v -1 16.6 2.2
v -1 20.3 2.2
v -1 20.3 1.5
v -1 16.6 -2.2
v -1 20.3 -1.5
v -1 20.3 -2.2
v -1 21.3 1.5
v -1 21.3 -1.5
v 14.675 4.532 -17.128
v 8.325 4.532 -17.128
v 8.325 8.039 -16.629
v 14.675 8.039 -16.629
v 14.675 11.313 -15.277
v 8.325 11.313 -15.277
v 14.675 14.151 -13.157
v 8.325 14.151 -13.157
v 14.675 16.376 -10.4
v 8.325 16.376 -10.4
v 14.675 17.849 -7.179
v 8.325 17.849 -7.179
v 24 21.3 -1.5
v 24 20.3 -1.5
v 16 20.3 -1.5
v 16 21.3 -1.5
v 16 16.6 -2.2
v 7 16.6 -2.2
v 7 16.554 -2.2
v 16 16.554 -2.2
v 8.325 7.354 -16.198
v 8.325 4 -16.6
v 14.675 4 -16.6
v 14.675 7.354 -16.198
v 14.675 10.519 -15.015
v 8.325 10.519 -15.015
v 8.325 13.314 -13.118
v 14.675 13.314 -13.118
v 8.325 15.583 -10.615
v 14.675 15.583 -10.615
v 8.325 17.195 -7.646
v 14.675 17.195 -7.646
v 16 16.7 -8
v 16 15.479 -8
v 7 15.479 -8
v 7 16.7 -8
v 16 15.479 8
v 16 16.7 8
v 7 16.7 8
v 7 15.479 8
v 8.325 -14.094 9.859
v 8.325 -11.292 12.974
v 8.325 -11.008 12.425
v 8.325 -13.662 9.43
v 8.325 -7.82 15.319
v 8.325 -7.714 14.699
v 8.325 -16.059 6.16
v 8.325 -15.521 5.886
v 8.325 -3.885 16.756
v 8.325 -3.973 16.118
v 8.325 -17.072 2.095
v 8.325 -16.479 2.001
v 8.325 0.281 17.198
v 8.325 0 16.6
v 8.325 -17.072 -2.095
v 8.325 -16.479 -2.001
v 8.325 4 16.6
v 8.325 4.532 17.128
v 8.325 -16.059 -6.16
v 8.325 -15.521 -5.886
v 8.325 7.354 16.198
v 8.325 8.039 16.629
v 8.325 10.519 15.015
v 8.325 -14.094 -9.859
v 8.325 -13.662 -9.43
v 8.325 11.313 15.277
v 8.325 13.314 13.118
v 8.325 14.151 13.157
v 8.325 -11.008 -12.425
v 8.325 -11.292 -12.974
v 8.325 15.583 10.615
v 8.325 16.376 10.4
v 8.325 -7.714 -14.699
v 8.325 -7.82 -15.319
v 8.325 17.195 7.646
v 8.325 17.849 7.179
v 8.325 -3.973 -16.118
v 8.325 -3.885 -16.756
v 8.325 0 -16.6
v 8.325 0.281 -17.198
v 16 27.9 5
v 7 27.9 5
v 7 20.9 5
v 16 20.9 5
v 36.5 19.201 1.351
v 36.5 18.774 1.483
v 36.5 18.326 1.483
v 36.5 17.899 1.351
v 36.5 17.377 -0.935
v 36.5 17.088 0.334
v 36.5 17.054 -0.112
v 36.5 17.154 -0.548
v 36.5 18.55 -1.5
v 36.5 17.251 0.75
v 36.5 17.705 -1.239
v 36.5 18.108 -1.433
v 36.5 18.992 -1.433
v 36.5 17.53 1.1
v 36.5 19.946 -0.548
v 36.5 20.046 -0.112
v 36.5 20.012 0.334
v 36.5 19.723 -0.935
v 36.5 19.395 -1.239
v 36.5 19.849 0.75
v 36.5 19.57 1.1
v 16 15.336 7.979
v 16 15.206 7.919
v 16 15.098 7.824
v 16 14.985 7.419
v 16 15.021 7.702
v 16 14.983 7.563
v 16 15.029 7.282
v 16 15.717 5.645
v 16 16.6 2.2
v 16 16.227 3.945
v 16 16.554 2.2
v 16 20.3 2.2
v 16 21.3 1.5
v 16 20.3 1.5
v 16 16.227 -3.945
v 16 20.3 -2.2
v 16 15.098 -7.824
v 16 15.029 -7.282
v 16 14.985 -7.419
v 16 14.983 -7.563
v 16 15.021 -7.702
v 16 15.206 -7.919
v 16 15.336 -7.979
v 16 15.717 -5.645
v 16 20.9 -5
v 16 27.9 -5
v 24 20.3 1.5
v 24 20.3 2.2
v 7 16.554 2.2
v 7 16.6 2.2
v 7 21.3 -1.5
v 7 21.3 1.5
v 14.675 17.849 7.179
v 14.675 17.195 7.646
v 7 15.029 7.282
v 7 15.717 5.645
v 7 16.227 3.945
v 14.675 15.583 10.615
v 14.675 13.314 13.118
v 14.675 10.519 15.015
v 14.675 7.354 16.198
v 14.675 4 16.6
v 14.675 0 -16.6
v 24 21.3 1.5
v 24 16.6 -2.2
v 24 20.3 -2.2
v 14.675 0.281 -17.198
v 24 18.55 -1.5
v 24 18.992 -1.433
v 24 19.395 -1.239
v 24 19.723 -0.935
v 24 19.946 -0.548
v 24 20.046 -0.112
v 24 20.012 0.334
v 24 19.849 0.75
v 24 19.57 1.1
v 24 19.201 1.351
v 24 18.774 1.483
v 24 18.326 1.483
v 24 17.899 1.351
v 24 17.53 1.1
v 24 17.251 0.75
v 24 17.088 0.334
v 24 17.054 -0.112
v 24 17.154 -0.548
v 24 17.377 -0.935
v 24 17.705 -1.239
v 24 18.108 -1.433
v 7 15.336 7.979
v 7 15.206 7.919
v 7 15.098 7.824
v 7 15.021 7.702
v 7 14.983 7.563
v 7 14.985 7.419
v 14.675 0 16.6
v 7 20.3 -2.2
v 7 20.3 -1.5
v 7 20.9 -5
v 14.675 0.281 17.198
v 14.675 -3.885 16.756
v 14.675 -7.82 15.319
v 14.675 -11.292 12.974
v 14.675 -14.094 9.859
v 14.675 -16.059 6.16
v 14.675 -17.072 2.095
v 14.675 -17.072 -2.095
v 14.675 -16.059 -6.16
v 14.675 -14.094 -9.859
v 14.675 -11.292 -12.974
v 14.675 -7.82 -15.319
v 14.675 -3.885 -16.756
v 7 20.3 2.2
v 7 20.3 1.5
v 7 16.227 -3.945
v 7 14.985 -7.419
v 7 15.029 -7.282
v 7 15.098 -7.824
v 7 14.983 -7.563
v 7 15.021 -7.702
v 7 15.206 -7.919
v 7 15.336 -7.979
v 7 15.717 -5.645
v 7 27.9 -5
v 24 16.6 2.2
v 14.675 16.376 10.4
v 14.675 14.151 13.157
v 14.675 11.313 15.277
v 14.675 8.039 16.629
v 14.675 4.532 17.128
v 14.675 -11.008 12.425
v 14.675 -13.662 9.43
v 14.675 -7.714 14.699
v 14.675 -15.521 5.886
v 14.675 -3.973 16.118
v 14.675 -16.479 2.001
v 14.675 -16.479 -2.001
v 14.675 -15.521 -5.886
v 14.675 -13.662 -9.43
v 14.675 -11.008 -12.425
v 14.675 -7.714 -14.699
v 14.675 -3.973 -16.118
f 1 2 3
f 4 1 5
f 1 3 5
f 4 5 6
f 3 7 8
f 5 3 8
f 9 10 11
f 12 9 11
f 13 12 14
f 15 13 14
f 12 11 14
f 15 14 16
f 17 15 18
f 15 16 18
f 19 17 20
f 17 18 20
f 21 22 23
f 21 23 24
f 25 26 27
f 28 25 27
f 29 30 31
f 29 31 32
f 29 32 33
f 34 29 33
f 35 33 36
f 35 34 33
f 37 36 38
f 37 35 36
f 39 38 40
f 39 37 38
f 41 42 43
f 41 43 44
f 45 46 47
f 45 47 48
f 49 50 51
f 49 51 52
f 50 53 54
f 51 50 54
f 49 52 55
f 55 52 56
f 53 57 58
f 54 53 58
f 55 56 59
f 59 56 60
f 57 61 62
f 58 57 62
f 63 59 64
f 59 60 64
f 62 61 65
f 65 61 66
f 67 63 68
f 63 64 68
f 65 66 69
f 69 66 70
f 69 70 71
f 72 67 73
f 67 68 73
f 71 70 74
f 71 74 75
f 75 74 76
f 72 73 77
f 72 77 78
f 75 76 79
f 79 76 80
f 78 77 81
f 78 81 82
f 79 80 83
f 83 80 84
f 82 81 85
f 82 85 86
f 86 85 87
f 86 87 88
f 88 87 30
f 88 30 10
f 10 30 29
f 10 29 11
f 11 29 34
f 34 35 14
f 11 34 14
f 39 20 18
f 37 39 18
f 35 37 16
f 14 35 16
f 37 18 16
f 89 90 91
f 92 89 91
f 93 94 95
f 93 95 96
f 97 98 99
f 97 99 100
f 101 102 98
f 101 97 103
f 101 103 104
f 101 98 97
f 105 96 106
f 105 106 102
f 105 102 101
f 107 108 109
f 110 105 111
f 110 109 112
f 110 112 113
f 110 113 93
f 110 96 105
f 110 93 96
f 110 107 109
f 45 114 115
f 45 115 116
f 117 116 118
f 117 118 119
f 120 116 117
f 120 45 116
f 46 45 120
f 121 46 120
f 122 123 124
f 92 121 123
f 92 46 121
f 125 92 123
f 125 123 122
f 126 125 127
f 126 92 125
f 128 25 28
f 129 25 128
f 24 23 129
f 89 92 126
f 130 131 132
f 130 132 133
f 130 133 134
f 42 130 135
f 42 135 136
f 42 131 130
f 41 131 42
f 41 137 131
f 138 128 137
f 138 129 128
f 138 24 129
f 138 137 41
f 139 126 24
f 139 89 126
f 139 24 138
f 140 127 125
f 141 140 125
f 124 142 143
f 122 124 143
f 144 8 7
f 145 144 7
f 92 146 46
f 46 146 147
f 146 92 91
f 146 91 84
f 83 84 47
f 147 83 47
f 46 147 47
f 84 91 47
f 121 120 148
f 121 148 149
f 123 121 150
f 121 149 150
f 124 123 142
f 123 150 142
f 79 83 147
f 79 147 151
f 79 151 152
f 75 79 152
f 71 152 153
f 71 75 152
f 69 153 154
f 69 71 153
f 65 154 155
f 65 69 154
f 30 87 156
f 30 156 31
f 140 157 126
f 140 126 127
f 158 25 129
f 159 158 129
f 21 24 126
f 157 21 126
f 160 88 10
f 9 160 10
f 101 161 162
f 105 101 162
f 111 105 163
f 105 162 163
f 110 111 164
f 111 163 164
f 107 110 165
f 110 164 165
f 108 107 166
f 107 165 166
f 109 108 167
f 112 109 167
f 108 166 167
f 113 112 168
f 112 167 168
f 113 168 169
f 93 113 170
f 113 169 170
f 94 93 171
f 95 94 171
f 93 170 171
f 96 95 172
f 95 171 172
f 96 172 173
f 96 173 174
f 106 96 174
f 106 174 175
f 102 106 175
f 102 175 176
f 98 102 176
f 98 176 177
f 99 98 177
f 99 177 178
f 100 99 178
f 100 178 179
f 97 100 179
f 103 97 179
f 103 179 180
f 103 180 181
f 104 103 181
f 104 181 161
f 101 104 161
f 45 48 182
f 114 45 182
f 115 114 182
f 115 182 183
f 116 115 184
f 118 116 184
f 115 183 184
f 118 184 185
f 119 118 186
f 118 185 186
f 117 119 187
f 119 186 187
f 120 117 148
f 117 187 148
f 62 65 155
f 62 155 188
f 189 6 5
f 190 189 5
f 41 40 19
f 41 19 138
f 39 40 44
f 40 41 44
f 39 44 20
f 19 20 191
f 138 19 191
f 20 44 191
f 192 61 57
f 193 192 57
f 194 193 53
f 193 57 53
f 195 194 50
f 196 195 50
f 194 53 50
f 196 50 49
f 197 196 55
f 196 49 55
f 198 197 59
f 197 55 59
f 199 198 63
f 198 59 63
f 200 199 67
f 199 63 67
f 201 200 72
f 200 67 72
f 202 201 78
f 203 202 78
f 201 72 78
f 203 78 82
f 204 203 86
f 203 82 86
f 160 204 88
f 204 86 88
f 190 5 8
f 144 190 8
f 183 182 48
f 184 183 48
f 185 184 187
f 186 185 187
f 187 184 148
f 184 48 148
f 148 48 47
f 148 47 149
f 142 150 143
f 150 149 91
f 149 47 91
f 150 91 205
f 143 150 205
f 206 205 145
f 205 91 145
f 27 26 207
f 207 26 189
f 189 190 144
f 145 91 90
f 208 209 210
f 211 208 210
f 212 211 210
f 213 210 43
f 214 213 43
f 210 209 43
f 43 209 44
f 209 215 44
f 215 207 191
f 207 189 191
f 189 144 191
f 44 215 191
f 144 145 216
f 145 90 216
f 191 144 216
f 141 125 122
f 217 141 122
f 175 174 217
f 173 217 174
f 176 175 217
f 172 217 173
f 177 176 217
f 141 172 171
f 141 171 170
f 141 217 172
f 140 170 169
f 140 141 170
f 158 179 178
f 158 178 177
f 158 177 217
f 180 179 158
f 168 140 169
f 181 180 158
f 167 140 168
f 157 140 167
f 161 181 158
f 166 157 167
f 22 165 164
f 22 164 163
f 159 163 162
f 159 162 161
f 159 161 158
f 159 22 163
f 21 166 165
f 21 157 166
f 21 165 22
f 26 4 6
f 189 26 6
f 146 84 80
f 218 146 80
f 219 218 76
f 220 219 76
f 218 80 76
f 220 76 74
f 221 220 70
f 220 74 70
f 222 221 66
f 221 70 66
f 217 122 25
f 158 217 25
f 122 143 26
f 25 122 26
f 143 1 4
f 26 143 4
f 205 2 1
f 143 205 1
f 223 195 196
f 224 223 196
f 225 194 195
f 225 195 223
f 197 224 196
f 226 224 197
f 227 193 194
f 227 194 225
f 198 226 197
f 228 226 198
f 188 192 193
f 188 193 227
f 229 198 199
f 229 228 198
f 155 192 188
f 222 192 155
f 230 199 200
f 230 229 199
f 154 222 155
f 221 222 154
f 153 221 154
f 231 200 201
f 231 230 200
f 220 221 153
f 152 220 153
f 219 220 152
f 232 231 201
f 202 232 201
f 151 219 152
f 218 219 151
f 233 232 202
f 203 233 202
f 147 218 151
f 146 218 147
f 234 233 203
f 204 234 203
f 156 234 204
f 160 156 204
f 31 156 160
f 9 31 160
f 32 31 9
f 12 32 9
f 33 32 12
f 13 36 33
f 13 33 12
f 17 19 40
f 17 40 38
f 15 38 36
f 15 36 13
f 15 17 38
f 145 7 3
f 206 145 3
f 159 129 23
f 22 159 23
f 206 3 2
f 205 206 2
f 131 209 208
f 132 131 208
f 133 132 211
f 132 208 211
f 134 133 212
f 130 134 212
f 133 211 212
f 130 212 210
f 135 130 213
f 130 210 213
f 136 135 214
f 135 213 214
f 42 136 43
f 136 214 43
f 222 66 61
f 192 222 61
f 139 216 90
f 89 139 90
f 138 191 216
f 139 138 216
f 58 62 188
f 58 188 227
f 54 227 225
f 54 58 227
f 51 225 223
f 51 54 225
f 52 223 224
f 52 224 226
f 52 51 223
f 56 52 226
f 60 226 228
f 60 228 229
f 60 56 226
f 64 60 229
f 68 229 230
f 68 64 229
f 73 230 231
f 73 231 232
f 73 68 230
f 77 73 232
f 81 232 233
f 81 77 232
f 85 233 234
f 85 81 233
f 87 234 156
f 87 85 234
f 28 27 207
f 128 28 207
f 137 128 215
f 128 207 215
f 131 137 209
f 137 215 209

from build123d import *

# Parameters (mm, degrees)
EXTRUDE_1_DEPTH      = 4.5
EXTRUDE_1_DEPTH_BACK = 4.5
EXTRUDE_2_DEPTH      = 3.175
EXTRUDE_2_DEPTH_BACK = 3.175
EXTRUDE_3_DEPTH      = 12.5
EXTRUDE_3_DEPTH_BACK = 12.5
SKETCH_4_R           = 1.5
EXTRUDE_4_DEPTH      = 25


with BuildPart() as part:
    # 草图1 → 凸台-拉伸1 (new, two sides: drawn at the far end of the back side and taken through both)
    with BuildSketch(Plane(origin=(11.5, 0, 0), x_dir=(0, 0, -1), z_dir=(1, 0, 0)).offset(-EXTRUDE_1_DEPTH_BACK)):
        with BuildLine():
            Line((-8, 16.7), (-8, 15.478695035))
            ThreePointArc((-8, 15.478695035), (-7.765507447, 15.055013793), (-7.281976818, 15.028732935))
            ThreePointArc((-7.281976818, 15.028732935), (-4.801971314, 15.994720113), (-2.2, 16.554455594))
            Line((-2.2, 16.554455594), (-2.2, 19.9))
            Line((-2.2, 19.9), (-1.5, 19.9))
            Line((-1.5, 19.9), (-1.5, 20.9))
            Line((-1.5, 20.9), (1.5, 20.9))
            Line((1.5, 20.9), (1.5, 19.9))
            Line((1.5, 19.9), (2.2, 19.9))
            Line((2.2, 19.9), (2.2, 16.554455594))
            ThreePointArc((2.2, 16.554455594), (4.801971275, 15.994720125), (7.281976744, 15.02873297))
            ThreePointArc((7.281976744, 15.02873297), (7.765507412, 15.055013771), (8, 15.478695035))
            Line((8, 15.478695035), (8, 16.7))
            Line((8, 16.7), (5, 20.9))
            Line((5, 20.9), (5, 27.9))
            Line((5, 27.9), (-5, 27.9))
            Line((-5, 27.9), (-5, 20.9))
            Line((-5, 20.9), (-8, 16.7))
        make_face()
    extrude(amount=EXTRUDE_1_DEPTH + EXTRUDE_1_DEPTH_BACK)

    # 草图2 → 凸台-拉伸2 (add, two sides: drawn at the far end of the back side and taken through both)
    with BuildSketch(Plane(origin=(11.5, 0, 0), x_dir=(0, 0, -1), z_dir=(1, 0, 0)).offset(-EXTRUDE_2_DEPTH_BACK)):
        with BuildLine():
            Line((17.197704205, 0.281016159), (17.128241699, 4.532001712))
            ThreePointArc((17.128241699, 4.532001712), (12.888690566, 14.42260896), (2.930137065, 18.5))
            Line((2.930137065, 18.5), (-2.930137065, 18.5))
            ThreePointArc((-2.930137065, 18.5), (-12.888690566, 14.42260896), (-17.128241699, 4.532001712))
            Line((-17.128241699, 4.532001712), (-17.197704205, 0.281016159))
            ThreePointArc((-17.197704205, 0.281016159), (0, -17.2), (17.197704205, 0.281016159))
        make_face()
        with BuildLine():
            Line((16.6, 0), (16.6, 4))
            ThreePointArc((16.6, 4), (12.440916293, 14.040916293), (2.4, 18.2))
            Line((2.4, 18.2), (-2.4, 18.2))
            ThreePointArc((-2.4, 18.2), (-12.440916293, 14.040916293), (-16.6, 4))
            Line((-16.6, 4), (-16.6, 0))
            ThreePointArc((-16.6, 0), (0, -16.6), (16.6, 0))
        make_face(mode=Mode.SUBTRACT)
    extrude(amount=EXTRUDE_2_DEPTH + EXTRUDE_2_DEPTH_BACK)

    # 草图3 → 凸台-拉伸3 (add, two sides: drawn at the far end of the back side and taken through both)
    with BuildSketch(Plane(origin=(11.5, 0, 0), x_dir=(0, 0, -1), z_dir=(1, 0, 0)).offset(-EXTRUDE_3_DEPTH_BACK)):
        Polygon((-2.2, 20.3), (-2.2, 16.6), (2.2, 16.6), (2.2, 20.3), (1.5, 20.3), (1.5, 21.3), (-1.5, 21.3), (-1.5, 20.3), align=None)
    extrude(amount=EXTRUDE_3_DEPTH + EXTRUDE_3_DEPTH_BACK)

    # 草图4 → 凸台-拉伸4 (add)
    with BuildSketch(Plane(origin=(11.5, 0, 0), x_dir=(0, 0, -1), z_dir=(1, 0, 0))):
        with Locations((0, 18.55)):
            Circle(SKETCH_4_R)
    extrude(amount=EXTRUDE_4_DEPTH)


solid = part.part
